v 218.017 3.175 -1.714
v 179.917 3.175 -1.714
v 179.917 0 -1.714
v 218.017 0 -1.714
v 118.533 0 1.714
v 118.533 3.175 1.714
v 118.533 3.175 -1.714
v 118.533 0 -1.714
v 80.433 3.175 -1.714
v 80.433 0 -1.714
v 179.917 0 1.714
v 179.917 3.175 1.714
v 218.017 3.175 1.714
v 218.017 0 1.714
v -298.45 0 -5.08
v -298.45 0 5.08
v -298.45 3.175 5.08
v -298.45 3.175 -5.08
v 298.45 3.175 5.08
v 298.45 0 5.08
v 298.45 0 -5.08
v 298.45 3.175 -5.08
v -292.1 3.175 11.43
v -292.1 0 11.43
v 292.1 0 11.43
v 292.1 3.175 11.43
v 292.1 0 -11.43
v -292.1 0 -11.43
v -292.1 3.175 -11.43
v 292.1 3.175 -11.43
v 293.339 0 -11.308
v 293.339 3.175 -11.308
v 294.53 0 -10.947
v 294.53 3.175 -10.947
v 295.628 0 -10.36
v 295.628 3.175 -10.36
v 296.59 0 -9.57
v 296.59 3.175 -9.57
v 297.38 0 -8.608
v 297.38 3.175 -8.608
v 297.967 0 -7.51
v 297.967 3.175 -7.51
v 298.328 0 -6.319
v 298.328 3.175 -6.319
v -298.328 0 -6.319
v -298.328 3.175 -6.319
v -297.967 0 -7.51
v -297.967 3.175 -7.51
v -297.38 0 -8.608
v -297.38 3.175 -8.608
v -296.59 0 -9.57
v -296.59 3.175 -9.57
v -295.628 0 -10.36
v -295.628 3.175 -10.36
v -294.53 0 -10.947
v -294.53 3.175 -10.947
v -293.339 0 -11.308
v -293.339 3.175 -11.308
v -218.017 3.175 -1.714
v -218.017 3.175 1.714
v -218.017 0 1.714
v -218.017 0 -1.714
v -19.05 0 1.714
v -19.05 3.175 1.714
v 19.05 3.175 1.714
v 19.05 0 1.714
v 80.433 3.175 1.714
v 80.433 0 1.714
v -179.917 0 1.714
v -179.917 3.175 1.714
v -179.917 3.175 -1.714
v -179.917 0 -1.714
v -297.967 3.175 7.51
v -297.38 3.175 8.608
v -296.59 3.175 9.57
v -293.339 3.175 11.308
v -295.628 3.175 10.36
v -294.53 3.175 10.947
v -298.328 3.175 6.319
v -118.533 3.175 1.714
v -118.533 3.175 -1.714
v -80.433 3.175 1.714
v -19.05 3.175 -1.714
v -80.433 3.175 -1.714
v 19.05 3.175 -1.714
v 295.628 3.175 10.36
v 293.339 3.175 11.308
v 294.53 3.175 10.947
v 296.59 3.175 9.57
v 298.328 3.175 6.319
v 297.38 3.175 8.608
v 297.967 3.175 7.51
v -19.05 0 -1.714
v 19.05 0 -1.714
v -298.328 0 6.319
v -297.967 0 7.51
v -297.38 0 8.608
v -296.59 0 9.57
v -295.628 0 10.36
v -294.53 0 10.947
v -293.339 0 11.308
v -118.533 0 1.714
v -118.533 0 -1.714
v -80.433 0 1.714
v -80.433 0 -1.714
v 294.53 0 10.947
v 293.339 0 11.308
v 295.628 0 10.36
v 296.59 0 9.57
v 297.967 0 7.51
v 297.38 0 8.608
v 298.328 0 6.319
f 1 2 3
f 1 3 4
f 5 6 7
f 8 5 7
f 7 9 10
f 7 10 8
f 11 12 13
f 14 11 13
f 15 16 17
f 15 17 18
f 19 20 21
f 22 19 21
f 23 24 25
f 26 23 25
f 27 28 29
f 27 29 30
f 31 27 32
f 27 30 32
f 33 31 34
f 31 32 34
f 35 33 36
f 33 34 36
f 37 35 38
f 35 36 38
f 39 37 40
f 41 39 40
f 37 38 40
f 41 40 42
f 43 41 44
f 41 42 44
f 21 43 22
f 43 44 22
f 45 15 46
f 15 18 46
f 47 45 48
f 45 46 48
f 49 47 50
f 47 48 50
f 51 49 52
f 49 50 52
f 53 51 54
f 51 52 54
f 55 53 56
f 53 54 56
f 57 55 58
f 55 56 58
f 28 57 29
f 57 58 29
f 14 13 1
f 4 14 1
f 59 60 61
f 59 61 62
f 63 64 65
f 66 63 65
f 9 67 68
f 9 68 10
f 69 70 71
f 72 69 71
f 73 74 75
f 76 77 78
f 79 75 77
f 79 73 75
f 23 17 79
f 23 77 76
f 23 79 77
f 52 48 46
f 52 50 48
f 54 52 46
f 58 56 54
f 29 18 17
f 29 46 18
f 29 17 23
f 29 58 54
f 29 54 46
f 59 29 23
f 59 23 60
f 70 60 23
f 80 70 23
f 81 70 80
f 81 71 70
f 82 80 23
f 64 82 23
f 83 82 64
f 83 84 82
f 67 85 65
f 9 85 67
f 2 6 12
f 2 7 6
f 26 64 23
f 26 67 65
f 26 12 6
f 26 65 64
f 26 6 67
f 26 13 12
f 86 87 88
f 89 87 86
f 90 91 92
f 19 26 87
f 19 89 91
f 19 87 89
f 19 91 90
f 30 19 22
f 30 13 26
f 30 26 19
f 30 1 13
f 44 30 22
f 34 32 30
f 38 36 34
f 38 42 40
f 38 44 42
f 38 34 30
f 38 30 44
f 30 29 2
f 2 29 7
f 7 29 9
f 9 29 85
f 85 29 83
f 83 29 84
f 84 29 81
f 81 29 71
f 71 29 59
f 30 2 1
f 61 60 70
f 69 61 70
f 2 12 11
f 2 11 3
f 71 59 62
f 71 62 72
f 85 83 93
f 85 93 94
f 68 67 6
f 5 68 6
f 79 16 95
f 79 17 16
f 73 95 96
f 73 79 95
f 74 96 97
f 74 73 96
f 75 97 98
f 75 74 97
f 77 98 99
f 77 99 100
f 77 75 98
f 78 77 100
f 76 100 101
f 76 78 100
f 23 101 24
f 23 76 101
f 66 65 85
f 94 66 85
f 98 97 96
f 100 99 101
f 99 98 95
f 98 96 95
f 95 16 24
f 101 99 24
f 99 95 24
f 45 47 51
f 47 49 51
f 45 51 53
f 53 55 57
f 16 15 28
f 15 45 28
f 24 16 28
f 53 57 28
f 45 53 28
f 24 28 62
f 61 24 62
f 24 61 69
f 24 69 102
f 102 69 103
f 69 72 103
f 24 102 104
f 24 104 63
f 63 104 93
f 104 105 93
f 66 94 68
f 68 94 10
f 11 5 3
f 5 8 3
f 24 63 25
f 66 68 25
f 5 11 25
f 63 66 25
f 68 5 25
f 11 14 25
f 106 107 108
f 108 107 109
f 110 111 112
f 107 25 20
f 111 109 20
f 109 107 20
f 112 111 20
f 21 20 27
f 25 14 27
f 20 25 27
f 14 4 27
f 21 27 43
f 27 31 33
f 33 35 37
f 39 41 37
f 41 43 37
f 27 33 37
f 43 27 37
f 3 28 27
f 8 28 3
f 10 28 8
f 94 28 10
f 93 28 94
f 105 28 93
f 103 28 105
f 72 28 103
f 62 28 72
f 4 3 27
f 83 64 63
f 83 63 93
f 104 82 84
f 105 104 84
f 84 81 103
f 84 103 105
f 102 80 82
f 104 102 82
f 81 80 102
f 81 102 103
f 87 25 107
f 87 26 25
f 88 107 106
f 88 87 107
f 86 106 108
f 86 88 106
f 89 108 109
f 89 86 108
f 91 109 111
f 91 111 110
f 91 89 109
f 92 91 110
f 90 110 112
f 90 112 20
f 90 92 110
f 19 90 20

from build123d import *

# Parameters (mm, degrees)
SKETCH1_W           = 596.9
SKETCH1_H           = 22.86
BOSS_EXTRUDE1_DEPTH = 3.175
SKETCH5_W           = 38.1
SKETCH5_H           = 3.429
CUT_EXTRUDE2_DEPTH  = 299.685667592
FILLET1_R           = 6.35


with BuildPart() as part:
    # Sketch1 → Boss-Extrude1 (new body)
    with BuildSketch(Plane(origin=(0, 0, 0), x_dir=(1, 0, 0), z_dir=(0, 1, 0))):
        Rectangle(SKETCH1_W, SKETCH1_H)
    extrude(amount=BOSS_EXTRUDE1_DEPTH)

    # Sketch5 → Cut-Extrude2 (cut, through all)
    with BuildSketch(Plane(origin=(0, 3.175, 0), x_dir=(1, 0, 0), z_dir=(0, 1, 0))):
        with Locations((-198.966666582, 0)):
            Rectangle(SKETCH5_W, SKETCH5_H)
        with Locations((-99.483333164, 0)):
            Rectangle(SKETCH5_W, SKETCH5_H)
        with Locations((1.69e-07, 0)):
            Rectangle(SKETCH5_W, SKETCH5_H)
        with Locations((99.483333333, 0)):
            Rectangle(SKETCH5_W, SKETCH5_H)
        with Locations((198.966666667, 0)):
            Rectangle(SKETCH5_W, SKETCH5_H)
    extrude(amount=-CUT_EXTRUDE2_DEPTH, mode=Mode.SUBTRACT)

    # Fillet1
    fillet1_edges = [part.edges().sort_by_distance(p)[0] for p in [
        (-298.45, 1.5875, -11.43),
        (298.45, 1.5875, -11.43),
        (298.45, 1.5875, 11.43),
        (-298.45, 1.5875, 11.43),
    ]]
    fillet(fillet1_edges, radius=FILLET1_R)


solid = part.part
